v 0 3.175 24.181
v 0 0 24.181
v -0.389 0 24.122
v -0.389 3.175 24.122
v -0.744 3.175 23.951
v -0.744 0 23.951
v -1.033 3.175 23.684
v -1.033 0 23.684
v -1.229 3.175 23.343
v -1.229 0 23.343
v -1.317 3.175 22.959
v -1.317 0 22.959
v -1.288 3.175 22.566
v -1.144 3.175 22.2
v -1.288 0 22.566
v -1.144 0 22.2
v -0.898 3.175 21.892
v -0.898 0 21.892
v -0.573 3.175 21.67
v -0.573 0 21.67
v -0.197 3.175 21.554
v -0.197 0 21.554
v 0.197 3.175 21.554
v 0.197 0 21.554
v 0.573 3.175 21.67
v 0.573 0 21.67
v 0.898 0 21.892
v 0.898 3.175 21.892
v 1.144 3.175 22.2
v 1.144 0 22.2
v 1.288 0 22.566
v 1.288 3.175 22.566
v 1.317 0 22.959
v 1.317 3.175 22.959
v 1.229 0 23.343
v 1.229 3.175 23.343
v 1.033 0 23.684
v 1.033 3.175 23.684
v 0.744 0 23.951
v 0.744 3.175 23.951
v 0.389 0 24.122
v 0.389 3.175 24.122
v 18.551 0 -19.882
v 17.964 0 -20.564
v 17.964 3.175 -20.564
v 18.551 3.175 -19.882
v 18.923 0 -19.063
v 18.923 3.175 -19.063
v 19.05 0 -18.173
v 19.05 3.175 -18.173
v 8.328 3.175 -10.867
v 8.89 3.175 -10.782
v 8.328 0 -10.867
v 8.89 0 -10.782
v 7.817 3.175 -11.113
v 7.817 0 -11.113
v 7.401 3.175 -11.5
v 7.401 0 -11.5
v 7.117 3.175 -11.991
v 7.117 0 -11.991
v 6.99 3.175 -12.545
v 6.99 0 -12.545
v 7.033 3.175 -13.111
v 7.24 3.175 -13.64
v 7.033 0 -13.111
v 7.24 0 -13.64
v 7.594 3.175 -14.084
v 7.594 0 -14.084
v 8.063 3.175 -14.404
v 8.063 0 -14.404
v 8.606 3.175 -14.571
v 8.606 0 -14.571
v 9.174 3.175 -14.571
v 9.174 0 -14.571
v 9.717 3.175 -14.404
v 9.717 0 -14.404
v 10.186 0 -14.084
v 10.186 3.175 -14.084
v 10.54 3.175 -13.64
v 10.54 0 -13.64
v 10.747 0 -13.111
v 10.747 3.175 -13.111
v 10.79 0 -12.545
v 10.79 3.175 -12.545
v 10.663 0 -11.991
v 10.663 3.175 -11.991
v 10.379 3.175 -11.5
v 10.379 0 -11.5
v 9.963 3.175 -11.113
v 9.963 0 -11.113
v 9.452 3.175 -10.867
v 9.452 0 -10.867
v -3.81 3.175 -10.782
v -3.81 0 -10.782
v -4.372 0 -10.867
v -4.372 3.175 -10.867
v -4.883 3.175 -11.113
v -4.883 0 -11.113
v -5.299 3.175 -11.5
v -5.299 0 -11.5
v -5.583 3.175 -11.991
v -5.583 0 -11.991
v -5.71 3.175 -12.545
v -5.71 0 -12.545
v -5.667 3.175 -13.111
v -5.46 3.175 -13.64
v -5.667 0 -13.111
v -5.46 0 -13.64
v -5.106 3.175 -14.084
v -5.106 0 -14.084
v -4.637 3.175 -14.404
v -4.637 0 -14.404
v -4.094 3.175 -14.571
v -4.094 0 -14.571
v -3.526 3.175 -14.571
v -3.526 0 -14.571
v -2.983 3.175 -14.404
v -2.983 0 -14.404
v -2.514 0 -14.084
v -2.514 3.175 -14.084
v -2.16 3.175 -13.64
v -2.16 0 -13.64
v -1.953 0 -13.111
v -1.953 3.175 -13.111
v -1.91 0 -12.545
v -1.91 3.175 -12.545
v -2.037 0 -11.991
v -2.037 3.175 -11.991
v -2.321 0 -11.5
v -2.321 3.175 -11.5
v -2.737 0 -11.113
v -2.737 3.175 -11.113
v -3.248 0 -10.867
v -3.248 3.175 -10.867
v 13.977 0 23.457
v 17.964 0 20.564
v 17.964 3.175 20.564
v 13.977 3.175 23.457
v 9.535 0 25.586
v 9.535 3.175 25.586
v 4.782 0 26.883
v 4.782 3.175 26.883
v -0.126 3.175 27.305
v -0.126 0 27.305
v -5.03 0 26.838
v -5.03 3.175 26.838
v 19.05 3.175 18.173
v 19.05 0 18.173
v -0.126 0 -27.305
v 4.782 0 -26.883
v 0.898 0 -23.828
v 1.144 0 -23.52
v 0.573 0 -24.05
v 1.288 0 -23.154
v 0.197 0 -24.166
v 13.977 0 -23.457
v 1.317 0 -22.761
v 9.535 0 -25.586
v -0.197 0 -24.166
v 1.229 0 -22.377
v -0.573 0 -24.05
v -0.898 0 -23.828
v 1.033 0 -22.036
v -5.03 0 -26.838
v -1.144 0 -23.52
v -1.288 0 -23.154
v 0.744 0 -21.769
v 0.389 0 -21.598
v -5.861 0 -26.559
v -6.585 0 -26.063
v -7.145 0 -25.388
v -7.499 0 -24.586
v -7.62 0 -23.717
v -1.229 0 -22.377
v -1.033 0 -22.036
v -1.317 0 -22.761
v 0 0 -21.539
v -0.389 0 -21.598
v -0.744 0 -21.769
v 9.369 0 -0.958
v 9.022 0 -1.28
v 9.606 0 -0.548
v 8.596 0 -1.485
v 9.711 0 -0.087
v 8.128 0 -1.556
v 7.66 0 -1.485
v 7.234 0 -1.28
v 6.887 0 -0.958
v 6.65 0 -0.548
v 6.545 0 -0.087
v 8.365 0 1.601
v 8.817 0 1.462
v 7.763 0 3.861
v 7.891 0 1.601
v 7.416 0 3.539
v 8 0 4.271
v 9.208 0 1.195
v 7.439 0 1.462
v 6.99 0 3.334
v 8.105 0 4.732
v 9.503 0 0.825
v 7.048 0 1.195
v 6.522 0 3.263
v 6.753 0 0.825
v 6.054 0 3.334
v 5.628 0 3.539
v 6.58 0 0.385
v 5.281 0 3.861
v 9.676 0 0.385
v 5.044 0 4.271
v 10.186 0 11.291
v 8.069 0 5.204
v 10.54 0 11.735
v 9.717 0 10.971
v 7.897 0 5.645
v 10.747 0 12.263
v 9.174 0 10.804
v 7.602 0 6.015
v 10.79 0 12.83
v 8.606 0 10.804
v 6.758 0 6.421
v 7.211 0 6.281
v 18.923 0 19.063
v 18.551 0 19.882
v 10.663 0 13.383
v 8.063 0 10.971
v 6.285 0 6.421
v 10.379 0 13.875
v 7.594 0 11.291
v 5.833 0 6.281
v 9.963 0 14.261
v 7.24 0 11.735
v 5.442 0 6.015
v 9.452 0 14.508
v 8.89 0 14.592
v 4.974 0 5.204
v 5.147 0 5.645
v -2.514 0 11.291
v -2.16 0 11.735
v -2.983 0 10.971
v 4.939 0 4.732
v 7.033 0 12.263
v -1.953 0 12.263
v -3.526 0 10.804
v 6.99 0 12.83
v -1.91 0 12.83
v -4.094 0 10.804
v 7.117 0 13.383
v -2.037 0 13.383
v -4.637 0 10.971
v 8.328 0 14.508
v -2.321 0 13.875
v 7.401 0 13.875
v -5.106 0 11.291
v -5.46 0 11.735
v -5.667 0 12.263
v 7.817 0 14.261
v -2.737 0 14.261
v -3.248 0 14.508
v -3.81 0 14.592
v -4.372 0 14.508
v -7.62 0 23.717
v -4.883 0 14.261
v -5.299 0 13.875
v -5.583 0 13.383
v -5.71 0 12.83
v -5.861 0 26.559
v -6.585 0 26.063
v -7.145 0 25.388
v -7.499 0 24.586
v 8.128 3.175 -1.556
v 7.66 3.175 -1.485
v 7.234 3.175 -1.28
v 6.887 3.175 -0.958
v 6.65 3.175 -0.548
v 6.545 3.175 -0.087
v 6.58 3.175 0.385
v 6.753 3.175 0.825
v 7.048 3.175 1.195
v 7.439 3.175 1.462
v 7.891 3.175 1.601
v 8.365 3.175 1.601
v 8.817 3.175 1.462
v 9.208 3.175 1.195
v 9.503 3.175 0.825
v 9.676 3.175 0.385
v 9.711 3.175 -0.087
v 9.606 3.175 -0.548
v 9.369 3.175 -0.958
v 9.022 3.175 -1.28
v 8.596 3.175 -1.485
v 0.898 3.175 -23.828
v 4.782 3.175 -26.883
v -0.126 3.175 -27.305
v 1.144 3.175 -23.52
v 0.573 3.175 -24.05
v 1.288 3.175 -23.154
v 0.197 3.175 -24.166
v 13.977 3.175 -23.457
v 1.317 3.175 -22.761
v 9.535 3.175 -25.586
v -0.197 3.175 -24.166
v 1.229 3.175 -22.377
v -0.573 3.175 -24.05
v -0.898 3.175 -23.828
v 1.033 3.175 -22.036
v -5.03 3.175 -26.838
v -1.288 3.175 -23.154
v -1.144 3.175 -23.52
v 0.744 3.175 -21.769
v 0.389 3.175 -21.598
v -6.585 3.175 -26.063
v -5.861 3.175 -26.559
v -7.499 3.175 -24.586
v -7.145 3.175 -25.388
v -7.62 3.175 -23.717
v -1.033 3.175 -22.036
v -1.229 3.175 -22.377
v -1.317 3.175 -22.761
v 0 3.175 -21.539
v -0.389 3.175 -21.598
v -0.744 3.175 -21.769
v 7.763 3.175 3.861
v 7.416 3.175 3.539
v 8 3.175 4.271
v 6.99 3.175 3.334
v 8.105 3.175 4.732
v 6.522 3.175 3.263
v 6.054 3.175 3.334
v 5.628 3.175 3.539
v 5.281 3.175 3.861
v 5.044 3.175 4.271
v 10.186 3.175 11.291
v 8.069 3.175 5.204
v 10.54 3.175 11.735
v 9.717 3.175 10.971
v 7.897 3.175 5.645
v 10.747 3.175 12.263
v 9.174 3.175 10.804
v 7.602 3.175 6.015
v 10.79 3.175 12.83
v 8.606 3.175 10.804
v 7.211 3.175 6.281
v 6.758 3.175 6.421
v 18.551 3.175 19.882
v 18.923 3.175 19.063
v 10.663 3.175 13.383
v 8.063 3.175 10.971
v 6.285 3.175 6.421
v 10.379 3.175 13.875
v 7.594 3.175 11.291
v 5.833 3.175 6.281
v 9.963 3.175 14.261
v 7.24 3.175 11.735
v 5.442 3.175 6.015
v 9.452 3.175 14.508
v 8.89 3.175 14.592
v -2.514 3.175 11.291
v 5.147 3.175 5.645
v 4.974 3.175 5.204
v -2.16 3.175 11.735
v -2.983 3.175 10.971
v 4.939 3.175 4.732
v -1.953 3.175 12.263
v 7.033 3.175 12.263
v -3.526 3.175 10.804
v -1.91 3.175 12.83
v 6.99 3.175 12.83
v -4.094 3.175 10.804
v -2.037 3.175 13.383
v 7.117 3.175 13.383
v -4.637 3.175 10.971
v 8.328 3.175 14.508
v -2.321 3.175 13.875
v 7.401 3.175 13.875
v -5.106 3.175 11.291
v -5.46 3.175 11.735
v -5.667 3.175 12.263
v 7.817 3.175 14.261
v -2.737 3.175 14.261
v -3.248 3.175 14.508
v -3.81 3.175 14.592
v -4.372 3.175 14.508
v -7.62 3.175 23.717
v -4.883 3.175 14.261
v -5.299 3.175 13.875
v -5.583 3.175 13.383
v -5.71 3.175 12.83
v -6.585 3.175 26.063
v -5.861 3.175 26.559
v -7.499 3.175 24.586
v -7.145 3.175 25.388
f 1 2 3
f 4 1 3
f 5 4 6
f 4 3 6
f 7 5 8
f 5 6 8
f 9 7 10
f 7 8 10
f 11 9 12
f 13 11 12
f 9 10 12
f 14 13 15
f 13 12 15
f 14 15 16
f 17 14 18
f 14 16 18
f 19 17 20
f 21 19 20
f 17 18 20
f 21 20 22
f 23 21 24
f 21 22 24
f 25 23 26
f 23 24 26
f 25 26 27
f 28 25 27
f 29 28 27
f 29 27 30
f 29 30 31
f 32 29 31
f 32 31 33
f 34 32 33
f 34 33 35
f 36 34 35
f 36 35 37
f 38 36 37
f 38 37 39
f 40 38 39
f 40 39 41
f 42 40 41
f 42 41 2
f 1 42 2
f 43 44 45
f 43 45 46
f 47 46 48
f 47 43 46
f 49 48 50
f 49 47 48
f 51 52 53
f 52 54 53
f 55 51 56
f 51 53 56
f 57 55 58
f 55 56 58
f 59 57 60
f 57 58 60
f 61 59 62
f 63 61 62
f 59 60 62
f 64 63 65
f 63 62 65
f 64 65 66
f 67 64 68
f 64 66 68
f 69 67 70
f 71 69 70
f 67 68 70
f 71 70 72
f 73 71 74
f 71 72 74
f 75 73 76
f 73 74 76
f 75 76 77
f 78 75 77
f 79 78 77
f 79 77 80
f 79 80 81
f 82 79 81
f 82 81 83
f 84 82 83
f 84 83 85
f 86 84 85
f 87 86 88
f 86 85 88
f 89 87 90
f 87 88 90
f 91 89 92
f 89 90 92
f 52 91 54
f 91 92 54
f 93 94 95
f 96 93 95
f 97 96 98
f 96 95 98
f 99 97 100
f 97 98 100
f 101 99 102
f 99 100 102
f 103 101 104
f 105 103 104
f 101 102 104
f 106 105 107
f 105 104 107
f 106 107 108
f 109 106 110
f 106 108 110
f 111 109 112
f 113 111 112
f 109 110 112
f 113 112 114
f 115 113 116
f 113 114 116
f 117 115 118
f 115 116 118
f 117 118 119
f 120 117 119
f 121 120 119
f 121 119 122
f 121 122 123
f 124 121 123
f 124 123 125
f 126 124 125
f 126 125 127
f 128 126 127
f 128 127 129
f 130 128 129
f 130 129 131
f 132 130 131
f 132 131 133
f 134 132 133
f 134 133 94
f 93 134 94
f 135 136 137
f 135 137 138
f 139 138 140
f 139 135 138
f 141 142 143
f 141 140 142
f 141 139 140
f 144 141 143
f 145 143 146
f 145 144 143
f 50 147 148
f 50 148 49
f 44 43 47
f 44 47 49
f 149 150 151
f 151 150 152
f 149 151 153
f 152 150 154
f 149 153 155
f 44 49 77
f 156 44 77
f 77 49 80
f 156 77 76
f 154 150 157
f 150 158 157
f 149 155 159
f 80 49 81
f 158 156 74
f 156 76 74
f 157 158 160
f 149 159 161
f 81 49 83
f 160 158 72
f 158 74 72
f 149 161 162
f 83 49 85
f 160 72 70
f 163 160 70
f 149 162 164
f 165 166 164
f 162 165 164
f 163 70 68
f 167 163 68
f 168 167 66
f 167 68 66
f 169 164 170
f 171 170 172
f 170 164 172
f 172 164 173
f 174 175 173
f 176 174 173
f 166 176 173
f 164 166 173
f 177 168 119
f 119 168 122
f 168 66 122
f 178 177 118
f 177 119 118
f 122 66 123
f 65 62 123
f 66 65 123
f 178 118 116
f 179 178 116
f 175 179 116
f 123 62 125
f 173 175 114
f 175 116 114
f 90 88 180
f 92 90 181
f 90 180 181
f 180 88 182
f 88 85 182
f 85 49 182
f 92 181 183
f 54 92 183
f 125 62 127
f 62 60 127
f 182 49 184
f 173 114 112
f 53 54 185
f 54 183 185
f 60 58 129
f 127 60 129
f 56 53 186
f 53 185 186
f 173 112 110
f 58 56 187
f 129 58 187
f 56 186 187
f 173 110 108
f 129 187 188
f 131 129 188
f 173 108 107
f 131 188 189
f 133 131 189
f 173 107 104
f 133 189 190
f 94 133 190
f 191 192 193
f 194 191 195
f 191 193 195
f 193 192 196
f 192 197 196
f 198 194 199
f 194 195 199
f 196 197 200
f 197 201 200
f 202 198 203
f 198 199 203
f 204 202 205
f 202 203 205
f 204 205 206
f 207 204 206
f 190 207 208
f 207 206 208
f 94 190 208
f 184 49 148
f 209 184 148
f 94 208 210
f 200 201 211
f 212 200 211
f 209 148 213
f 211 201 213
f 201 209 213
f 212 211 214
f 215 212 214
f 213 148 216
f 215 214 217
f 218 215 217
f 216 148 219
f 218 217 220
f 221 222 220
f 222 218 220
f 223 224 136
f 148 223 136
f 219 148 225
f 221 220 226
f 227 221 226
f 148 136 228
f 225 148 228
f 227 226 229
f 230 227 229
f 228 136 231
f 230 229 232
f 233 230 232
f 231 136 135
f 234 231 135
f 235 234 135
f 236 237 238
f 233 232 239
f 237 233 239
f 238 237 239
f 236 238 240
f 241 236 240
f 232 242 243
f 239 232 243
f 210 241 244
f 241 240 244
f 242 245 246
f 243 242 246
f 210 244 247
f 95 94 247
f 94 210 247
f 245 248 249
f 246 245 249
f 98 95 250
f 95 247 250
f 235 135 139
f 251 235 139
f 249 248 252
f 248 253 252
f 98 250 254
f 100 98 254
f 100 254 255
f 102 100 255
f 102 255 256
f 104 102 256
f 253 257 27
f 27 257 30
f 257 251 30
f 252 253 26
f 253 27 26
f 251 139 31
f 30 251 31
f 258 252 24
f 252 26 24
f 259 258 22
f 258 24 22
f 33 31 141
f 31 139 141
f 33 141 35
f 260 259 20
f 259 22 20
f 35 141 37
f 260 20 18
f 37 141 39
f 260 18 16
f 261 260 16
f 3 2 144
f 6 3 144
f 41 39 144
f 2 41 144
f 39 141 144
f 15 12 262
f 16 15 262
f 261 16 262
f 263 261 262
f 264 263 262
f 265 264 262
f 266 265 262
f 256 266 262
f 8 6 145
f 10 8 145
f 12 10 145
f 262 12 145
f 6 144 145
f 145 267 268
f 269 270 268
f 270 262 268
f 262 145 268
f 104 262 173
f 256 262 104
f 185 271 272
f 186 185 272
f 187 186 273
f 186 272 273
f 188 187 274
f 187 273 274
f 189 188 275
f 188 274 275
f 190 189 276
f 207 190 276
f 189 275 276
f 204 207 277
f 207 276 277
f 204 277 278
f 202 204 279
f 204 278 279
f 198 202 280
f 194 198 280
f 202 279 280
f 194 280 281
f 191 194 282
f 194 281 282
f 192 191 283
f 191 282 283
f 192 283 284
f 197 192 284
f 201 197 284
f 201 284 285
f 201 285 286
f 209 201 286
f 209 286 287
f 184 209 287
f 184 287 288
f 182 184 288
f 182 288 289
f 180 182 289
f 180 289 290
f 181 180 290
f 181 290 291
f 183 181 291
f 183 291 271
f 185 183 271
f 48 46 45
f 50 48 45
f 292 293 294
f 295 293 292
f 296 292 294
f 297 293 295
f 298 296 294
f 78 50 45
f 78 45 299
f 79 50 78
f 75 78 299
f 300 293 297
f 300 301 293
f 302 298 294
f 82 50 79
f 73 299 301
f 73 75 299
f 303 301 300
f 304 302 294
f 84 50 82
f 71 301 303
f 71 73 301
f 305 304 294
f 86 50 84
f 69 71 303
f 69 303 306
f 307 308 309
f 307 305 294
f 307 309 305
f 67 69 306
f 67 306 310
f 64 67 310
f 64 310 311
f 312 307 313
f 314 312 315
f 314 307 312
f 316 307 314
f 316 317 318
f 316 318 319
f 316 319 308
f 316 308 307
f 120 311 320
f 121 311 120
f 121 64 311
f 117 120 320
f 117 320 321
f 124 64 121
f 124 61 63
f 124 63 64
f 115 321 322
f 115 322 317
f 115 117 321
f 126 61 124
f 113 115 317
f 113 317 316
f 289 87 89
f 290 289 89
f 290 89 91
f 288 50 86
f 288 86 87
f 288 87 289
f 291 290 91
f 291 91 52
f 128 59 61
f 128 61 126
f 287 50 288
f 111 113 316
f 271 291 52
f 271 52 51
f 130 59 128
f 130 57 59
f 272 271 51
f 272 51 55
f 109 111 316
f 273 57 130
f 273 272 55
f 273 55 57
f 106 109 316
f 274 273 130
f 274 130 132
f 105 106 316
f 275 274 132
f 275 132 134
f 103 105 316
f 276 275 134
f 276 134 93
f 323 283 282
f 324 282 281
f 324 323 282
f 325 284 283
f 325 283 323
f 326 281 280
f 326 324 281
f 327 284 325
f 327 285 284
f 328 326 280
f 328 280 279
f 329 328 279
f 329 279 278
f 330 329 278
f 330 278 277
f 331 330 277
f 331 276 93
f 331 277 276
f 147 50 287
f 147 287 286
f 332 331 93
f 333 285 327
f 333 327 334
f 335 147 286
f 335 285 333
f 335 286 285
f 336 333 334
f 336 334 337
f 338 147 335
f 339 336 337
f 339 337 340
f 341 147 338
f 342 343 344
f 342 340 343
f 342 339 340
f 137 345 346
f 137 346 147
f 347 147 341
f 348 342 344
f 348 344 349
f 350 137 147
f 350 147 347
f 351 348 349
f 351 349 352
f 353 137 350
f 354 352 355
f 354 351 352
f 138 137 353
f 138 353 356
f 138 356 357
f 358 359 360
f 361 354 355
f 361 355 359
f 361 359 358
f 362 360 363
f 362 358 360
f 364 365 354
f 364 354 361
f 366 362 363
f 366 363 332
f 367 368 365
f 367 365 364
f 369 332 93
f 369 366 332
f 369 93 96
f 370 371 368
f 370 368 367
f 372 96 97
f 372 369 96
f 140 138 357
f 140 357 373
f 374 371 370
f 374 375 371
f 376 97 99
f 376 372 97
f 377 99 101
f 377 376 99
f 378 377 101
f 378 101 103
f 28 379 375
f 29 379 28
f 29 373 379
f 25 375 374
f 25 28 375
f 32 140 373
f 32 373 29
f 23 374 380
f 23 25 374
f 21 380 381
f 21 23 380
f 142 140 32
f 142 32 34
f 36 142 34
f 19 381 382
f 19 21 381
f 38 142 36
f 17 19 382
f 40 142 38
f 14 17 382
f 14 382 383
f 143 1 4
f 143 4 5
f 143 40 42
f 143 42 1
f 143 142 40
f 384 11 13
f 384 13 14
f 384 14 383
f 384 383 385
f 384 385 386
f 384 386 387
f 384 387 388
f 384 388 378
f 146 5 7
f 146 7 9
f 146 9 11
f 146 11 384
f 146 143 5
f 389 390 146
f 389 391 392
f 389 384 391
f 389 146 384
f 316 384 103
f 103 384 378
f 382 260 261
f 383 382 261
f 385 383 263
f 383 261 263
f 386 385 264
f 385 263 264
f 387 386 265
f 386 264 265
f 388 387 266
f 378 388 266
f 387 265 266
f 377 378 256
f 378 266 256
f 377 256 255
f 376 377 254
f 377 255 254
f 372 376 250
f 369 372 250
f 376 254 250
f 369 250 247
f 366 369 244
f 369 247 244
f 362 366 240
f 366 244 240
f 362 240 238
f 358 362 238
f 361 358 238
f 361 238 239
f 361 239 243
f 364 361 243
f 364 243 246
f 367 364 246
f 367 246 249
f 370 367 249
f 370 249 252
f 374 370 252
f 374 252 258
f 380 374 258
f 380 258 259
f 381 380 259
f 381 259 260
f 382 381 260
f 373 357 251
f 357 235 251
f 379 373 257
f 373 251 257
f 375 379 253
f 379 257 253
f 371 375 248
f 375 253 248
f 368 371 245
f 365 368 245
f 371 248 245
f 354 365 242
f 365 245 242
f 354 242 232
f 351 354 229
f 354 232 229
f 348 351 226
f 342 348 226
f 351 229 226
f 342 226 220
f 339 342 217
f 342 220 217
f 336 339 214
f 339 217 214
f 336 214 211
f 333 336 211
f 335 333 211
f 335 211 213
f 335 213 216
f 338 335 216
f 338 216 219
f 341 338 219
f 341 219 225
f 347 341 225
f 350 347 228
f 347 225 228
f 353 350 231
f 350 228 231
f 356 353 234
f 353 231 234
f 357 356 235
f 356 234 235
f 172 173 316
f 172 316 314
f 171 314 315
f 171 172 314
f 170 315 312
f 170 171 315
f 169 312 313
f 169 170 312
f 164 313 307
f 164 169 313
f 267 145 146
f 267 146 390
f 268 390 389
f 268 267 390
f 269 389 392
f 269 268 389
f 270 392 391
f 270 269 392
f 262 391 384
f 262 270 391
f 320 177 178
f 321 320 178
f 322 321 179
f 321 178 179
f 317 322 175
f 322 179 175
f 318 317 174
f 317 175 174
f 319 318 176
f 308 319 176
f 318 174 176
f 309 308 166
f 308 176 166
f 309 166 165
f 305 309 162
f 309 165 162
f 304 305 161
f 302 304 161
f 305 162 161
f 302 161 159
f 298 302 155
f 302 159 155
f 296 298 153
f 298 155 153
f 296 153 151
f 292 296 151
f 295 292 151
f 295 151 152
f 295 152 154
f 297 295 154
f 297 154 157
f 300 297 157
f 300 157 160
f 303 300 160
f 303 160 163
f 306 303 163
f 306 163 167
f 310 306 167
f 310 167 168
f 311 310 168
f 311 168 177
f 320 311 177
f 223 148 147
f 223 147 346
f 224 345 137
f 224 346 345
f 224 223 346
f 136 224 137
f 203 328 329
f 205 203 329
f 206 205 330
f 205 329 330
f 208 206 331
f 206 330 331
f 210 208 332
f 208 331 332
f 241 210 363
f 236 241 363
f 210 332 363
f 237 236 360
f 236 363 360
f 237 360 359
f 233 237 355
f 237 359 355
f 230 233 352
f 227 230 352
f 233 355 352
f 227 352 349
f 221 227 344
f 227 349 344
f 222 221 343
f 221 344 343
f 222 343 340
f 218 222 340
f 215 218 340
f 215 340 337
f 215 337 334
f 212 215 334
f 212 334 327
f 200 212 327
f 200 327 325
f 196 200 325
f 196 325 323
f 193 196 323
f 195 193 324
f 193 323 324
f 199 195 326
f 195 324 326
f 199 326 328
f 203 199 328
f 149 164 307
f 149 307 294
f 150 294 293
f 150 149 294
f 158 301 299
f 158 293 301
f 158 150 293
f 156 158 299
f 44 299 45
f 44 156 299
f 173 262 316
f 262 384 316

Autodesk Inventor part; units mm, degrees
ref_plane "YZ Plane" through (0, 0, 0) normal (1, 0, 0) x (0, 1, 0)
ref_plane "XZ Plane" through (0, 0, 0) normal (0, 1, 0) x (-1, 0, 0)
ref_plane "XY Plane" through (0, 0, 0) normal (0, 0, 1) x (1, 0, 0)
sketch "Sketch1" plane through (0, 0, 0) normal (0, 1, 0) x (-1, 0, 0)
  circle A0 centre (0, 0) radius 27.305
  dimension "d85" = 54.61
extrude "Extrusion1" add sketch "Sketch1" along normal blind 3.175
sketch "Sketch2" plane through (0, 3.175, 0) normal (0, 1, 0) x (1, 0, 0)
  circle A0 centre (0, -22.86) radius 1.905
  circle A1 centre (0, 22.86) radius 1.905
  circle A2 centre (0, 0) radius 3.4925
  circle A3 centre (0, 0) radius 27.305 projected
  line L0 (0, 0) -> (0, -35.2816) construction
  line L1 (0, 0) -> (-33.3398, 0) construction
  circle A4 centre (0, -22.86) radius 4.7625
  dimension "d105" = 6.985
  dimension "d107" = 3.81
  dimension "d109" = 3.81
  dimension "d147" = 0
  dimension "d148" = 0
  dimension "d149" = 22.86
  dimension "d150" = 22.86
  dimension "d151" = 9.525
sketch "Sketch3" plane through (0, 0, 0) normal (0, -1, 0) x (1, 0, 0)
  line L0 (-12.7, -4.445) -> (-2.54, -4.445)
  line L1 (-2.54, -4.445) -> (-2.54, 4.445)
  line L2 (-2.54, 4.445) -> (-12.7, 4.445)
  line L3 (-12.7, 4.445) -> (-12.7, -4.445)
  line L4 (-38.227, 0) -> (38.227, 0) projected
  line L5 (0, -38.227) -> (0, 38.227) projected
  point P0 (0, 0)
  dimension "d116" = 10.16
  dimension "d125" = 8.89
  dimension "d126" = 12.7
extrude "Extrusion3" [suppressed]
fillet "Fillet1" [suppressed]
sketch "Sketch4" plane through (0, 3.175, 0) normal (0, 1, 0) x (1, 0, 0)
  circle A0 centre (0, 0) radius 27.305 projected
  line L0 (-7.62, -26.2202) -> (-7.62, 26.2202)
  line L1 (19.05, -19.5617) -> (19.05, 19.5617)
  dimension "d121" = 7.62
  dimension "d122" = 19.05
extrude "Extrusion4" cut sketch "Sketch4" against normal through all contours A0 L1 | L0 A0
hole "Hole10" at (0, 3.175, -22.86) at (0, 3.175, 22.86) direction (0, -1, 0) diameter 2.6416 end through all thread size "6-32 UNC" class "2B" standard "ANSI Unified Screw Threads"
sketch "Sketch5" plane through (0, 3.175, 0) normal (0, 1, 0) x (1, 0, 0)
  line L0 (0, 0) -> (23.5566, 0) construction
  line L1 (19.05, -19.5617) -> (19.05, 19.5617) projected
  point P0 (8.89, 12.6873)
  point P1 (8.89, -12.6873)
  point P2 (-3.81, -12.6873)
  point P3 (-3.81, 12.6873)
  dimension "d136" = 25.3746
  dimension "d137" = 12.7
  dimension "d146" = 22.86
  dimension "d160" = 22.86
  dimension "d161" = 10.16
hole "Hole11" at (8.89, 3.175, -12.6873) at (8.89, 3.175, 12.6873) at (-3.81, 3.175, 12.6873) at (-3.81, 3.175, -12.6873) direction (0, -1, 0) diameter 3.81 depth 25.4 tip angle 118 clearance for "Flat Head Machine Screw (82)" size "#6" standard "Ansi Unified Screw Threads"
sketch "Sketch6" plane through (0, 0, 0) normal (0, -1, 0) x (1, 0, 0)
  circle A0 centre (8.1279, 0.0315) radius 1.5875 projected
  circle A1 centre (6.5218, 4.8509) radius 1.5875 projected
  circle A2 centre (8.1279, 0.0315) radius 1.5875 projected
  line L0 (-0.8446, 5.1702) -> (-2.5619, 10.3231) projected
  arc A3 (4.1433, -9.7961) -> (-2.5619, 10.3231) centre (0, 0) ccw projected
  line L1 (4.1433, -9.7961) -> (2.426, -4.6432) projected
  arc A4 (2.426, -4.6432) -> (-0.8446, 5.1702) centre (0, 0) ccw projected
  point P0 (0, 0)
hole "Hole12" at (8.1279, 0, 0.0315) at (6.5218, 0, 4.8509) direction (0, 1, 0) diameter 3.175 end through all
fillet "Fillet2" radius 3.175 4 edges at (-7.62, 1.5875, 26.2202) (-7.62, 1.5875, -26.2202) (19.05, 1.5875, 19.5617) (19.05, 1.5875, -19.5617)
equation "\"d107\" = d106"
equation "\"d109\" = d106"
equation "\"d150\" = d149"
equation "\"d106\" = 3.81"
properties part number "Shield_3_Ground_v4" material "Stainless Steel"
